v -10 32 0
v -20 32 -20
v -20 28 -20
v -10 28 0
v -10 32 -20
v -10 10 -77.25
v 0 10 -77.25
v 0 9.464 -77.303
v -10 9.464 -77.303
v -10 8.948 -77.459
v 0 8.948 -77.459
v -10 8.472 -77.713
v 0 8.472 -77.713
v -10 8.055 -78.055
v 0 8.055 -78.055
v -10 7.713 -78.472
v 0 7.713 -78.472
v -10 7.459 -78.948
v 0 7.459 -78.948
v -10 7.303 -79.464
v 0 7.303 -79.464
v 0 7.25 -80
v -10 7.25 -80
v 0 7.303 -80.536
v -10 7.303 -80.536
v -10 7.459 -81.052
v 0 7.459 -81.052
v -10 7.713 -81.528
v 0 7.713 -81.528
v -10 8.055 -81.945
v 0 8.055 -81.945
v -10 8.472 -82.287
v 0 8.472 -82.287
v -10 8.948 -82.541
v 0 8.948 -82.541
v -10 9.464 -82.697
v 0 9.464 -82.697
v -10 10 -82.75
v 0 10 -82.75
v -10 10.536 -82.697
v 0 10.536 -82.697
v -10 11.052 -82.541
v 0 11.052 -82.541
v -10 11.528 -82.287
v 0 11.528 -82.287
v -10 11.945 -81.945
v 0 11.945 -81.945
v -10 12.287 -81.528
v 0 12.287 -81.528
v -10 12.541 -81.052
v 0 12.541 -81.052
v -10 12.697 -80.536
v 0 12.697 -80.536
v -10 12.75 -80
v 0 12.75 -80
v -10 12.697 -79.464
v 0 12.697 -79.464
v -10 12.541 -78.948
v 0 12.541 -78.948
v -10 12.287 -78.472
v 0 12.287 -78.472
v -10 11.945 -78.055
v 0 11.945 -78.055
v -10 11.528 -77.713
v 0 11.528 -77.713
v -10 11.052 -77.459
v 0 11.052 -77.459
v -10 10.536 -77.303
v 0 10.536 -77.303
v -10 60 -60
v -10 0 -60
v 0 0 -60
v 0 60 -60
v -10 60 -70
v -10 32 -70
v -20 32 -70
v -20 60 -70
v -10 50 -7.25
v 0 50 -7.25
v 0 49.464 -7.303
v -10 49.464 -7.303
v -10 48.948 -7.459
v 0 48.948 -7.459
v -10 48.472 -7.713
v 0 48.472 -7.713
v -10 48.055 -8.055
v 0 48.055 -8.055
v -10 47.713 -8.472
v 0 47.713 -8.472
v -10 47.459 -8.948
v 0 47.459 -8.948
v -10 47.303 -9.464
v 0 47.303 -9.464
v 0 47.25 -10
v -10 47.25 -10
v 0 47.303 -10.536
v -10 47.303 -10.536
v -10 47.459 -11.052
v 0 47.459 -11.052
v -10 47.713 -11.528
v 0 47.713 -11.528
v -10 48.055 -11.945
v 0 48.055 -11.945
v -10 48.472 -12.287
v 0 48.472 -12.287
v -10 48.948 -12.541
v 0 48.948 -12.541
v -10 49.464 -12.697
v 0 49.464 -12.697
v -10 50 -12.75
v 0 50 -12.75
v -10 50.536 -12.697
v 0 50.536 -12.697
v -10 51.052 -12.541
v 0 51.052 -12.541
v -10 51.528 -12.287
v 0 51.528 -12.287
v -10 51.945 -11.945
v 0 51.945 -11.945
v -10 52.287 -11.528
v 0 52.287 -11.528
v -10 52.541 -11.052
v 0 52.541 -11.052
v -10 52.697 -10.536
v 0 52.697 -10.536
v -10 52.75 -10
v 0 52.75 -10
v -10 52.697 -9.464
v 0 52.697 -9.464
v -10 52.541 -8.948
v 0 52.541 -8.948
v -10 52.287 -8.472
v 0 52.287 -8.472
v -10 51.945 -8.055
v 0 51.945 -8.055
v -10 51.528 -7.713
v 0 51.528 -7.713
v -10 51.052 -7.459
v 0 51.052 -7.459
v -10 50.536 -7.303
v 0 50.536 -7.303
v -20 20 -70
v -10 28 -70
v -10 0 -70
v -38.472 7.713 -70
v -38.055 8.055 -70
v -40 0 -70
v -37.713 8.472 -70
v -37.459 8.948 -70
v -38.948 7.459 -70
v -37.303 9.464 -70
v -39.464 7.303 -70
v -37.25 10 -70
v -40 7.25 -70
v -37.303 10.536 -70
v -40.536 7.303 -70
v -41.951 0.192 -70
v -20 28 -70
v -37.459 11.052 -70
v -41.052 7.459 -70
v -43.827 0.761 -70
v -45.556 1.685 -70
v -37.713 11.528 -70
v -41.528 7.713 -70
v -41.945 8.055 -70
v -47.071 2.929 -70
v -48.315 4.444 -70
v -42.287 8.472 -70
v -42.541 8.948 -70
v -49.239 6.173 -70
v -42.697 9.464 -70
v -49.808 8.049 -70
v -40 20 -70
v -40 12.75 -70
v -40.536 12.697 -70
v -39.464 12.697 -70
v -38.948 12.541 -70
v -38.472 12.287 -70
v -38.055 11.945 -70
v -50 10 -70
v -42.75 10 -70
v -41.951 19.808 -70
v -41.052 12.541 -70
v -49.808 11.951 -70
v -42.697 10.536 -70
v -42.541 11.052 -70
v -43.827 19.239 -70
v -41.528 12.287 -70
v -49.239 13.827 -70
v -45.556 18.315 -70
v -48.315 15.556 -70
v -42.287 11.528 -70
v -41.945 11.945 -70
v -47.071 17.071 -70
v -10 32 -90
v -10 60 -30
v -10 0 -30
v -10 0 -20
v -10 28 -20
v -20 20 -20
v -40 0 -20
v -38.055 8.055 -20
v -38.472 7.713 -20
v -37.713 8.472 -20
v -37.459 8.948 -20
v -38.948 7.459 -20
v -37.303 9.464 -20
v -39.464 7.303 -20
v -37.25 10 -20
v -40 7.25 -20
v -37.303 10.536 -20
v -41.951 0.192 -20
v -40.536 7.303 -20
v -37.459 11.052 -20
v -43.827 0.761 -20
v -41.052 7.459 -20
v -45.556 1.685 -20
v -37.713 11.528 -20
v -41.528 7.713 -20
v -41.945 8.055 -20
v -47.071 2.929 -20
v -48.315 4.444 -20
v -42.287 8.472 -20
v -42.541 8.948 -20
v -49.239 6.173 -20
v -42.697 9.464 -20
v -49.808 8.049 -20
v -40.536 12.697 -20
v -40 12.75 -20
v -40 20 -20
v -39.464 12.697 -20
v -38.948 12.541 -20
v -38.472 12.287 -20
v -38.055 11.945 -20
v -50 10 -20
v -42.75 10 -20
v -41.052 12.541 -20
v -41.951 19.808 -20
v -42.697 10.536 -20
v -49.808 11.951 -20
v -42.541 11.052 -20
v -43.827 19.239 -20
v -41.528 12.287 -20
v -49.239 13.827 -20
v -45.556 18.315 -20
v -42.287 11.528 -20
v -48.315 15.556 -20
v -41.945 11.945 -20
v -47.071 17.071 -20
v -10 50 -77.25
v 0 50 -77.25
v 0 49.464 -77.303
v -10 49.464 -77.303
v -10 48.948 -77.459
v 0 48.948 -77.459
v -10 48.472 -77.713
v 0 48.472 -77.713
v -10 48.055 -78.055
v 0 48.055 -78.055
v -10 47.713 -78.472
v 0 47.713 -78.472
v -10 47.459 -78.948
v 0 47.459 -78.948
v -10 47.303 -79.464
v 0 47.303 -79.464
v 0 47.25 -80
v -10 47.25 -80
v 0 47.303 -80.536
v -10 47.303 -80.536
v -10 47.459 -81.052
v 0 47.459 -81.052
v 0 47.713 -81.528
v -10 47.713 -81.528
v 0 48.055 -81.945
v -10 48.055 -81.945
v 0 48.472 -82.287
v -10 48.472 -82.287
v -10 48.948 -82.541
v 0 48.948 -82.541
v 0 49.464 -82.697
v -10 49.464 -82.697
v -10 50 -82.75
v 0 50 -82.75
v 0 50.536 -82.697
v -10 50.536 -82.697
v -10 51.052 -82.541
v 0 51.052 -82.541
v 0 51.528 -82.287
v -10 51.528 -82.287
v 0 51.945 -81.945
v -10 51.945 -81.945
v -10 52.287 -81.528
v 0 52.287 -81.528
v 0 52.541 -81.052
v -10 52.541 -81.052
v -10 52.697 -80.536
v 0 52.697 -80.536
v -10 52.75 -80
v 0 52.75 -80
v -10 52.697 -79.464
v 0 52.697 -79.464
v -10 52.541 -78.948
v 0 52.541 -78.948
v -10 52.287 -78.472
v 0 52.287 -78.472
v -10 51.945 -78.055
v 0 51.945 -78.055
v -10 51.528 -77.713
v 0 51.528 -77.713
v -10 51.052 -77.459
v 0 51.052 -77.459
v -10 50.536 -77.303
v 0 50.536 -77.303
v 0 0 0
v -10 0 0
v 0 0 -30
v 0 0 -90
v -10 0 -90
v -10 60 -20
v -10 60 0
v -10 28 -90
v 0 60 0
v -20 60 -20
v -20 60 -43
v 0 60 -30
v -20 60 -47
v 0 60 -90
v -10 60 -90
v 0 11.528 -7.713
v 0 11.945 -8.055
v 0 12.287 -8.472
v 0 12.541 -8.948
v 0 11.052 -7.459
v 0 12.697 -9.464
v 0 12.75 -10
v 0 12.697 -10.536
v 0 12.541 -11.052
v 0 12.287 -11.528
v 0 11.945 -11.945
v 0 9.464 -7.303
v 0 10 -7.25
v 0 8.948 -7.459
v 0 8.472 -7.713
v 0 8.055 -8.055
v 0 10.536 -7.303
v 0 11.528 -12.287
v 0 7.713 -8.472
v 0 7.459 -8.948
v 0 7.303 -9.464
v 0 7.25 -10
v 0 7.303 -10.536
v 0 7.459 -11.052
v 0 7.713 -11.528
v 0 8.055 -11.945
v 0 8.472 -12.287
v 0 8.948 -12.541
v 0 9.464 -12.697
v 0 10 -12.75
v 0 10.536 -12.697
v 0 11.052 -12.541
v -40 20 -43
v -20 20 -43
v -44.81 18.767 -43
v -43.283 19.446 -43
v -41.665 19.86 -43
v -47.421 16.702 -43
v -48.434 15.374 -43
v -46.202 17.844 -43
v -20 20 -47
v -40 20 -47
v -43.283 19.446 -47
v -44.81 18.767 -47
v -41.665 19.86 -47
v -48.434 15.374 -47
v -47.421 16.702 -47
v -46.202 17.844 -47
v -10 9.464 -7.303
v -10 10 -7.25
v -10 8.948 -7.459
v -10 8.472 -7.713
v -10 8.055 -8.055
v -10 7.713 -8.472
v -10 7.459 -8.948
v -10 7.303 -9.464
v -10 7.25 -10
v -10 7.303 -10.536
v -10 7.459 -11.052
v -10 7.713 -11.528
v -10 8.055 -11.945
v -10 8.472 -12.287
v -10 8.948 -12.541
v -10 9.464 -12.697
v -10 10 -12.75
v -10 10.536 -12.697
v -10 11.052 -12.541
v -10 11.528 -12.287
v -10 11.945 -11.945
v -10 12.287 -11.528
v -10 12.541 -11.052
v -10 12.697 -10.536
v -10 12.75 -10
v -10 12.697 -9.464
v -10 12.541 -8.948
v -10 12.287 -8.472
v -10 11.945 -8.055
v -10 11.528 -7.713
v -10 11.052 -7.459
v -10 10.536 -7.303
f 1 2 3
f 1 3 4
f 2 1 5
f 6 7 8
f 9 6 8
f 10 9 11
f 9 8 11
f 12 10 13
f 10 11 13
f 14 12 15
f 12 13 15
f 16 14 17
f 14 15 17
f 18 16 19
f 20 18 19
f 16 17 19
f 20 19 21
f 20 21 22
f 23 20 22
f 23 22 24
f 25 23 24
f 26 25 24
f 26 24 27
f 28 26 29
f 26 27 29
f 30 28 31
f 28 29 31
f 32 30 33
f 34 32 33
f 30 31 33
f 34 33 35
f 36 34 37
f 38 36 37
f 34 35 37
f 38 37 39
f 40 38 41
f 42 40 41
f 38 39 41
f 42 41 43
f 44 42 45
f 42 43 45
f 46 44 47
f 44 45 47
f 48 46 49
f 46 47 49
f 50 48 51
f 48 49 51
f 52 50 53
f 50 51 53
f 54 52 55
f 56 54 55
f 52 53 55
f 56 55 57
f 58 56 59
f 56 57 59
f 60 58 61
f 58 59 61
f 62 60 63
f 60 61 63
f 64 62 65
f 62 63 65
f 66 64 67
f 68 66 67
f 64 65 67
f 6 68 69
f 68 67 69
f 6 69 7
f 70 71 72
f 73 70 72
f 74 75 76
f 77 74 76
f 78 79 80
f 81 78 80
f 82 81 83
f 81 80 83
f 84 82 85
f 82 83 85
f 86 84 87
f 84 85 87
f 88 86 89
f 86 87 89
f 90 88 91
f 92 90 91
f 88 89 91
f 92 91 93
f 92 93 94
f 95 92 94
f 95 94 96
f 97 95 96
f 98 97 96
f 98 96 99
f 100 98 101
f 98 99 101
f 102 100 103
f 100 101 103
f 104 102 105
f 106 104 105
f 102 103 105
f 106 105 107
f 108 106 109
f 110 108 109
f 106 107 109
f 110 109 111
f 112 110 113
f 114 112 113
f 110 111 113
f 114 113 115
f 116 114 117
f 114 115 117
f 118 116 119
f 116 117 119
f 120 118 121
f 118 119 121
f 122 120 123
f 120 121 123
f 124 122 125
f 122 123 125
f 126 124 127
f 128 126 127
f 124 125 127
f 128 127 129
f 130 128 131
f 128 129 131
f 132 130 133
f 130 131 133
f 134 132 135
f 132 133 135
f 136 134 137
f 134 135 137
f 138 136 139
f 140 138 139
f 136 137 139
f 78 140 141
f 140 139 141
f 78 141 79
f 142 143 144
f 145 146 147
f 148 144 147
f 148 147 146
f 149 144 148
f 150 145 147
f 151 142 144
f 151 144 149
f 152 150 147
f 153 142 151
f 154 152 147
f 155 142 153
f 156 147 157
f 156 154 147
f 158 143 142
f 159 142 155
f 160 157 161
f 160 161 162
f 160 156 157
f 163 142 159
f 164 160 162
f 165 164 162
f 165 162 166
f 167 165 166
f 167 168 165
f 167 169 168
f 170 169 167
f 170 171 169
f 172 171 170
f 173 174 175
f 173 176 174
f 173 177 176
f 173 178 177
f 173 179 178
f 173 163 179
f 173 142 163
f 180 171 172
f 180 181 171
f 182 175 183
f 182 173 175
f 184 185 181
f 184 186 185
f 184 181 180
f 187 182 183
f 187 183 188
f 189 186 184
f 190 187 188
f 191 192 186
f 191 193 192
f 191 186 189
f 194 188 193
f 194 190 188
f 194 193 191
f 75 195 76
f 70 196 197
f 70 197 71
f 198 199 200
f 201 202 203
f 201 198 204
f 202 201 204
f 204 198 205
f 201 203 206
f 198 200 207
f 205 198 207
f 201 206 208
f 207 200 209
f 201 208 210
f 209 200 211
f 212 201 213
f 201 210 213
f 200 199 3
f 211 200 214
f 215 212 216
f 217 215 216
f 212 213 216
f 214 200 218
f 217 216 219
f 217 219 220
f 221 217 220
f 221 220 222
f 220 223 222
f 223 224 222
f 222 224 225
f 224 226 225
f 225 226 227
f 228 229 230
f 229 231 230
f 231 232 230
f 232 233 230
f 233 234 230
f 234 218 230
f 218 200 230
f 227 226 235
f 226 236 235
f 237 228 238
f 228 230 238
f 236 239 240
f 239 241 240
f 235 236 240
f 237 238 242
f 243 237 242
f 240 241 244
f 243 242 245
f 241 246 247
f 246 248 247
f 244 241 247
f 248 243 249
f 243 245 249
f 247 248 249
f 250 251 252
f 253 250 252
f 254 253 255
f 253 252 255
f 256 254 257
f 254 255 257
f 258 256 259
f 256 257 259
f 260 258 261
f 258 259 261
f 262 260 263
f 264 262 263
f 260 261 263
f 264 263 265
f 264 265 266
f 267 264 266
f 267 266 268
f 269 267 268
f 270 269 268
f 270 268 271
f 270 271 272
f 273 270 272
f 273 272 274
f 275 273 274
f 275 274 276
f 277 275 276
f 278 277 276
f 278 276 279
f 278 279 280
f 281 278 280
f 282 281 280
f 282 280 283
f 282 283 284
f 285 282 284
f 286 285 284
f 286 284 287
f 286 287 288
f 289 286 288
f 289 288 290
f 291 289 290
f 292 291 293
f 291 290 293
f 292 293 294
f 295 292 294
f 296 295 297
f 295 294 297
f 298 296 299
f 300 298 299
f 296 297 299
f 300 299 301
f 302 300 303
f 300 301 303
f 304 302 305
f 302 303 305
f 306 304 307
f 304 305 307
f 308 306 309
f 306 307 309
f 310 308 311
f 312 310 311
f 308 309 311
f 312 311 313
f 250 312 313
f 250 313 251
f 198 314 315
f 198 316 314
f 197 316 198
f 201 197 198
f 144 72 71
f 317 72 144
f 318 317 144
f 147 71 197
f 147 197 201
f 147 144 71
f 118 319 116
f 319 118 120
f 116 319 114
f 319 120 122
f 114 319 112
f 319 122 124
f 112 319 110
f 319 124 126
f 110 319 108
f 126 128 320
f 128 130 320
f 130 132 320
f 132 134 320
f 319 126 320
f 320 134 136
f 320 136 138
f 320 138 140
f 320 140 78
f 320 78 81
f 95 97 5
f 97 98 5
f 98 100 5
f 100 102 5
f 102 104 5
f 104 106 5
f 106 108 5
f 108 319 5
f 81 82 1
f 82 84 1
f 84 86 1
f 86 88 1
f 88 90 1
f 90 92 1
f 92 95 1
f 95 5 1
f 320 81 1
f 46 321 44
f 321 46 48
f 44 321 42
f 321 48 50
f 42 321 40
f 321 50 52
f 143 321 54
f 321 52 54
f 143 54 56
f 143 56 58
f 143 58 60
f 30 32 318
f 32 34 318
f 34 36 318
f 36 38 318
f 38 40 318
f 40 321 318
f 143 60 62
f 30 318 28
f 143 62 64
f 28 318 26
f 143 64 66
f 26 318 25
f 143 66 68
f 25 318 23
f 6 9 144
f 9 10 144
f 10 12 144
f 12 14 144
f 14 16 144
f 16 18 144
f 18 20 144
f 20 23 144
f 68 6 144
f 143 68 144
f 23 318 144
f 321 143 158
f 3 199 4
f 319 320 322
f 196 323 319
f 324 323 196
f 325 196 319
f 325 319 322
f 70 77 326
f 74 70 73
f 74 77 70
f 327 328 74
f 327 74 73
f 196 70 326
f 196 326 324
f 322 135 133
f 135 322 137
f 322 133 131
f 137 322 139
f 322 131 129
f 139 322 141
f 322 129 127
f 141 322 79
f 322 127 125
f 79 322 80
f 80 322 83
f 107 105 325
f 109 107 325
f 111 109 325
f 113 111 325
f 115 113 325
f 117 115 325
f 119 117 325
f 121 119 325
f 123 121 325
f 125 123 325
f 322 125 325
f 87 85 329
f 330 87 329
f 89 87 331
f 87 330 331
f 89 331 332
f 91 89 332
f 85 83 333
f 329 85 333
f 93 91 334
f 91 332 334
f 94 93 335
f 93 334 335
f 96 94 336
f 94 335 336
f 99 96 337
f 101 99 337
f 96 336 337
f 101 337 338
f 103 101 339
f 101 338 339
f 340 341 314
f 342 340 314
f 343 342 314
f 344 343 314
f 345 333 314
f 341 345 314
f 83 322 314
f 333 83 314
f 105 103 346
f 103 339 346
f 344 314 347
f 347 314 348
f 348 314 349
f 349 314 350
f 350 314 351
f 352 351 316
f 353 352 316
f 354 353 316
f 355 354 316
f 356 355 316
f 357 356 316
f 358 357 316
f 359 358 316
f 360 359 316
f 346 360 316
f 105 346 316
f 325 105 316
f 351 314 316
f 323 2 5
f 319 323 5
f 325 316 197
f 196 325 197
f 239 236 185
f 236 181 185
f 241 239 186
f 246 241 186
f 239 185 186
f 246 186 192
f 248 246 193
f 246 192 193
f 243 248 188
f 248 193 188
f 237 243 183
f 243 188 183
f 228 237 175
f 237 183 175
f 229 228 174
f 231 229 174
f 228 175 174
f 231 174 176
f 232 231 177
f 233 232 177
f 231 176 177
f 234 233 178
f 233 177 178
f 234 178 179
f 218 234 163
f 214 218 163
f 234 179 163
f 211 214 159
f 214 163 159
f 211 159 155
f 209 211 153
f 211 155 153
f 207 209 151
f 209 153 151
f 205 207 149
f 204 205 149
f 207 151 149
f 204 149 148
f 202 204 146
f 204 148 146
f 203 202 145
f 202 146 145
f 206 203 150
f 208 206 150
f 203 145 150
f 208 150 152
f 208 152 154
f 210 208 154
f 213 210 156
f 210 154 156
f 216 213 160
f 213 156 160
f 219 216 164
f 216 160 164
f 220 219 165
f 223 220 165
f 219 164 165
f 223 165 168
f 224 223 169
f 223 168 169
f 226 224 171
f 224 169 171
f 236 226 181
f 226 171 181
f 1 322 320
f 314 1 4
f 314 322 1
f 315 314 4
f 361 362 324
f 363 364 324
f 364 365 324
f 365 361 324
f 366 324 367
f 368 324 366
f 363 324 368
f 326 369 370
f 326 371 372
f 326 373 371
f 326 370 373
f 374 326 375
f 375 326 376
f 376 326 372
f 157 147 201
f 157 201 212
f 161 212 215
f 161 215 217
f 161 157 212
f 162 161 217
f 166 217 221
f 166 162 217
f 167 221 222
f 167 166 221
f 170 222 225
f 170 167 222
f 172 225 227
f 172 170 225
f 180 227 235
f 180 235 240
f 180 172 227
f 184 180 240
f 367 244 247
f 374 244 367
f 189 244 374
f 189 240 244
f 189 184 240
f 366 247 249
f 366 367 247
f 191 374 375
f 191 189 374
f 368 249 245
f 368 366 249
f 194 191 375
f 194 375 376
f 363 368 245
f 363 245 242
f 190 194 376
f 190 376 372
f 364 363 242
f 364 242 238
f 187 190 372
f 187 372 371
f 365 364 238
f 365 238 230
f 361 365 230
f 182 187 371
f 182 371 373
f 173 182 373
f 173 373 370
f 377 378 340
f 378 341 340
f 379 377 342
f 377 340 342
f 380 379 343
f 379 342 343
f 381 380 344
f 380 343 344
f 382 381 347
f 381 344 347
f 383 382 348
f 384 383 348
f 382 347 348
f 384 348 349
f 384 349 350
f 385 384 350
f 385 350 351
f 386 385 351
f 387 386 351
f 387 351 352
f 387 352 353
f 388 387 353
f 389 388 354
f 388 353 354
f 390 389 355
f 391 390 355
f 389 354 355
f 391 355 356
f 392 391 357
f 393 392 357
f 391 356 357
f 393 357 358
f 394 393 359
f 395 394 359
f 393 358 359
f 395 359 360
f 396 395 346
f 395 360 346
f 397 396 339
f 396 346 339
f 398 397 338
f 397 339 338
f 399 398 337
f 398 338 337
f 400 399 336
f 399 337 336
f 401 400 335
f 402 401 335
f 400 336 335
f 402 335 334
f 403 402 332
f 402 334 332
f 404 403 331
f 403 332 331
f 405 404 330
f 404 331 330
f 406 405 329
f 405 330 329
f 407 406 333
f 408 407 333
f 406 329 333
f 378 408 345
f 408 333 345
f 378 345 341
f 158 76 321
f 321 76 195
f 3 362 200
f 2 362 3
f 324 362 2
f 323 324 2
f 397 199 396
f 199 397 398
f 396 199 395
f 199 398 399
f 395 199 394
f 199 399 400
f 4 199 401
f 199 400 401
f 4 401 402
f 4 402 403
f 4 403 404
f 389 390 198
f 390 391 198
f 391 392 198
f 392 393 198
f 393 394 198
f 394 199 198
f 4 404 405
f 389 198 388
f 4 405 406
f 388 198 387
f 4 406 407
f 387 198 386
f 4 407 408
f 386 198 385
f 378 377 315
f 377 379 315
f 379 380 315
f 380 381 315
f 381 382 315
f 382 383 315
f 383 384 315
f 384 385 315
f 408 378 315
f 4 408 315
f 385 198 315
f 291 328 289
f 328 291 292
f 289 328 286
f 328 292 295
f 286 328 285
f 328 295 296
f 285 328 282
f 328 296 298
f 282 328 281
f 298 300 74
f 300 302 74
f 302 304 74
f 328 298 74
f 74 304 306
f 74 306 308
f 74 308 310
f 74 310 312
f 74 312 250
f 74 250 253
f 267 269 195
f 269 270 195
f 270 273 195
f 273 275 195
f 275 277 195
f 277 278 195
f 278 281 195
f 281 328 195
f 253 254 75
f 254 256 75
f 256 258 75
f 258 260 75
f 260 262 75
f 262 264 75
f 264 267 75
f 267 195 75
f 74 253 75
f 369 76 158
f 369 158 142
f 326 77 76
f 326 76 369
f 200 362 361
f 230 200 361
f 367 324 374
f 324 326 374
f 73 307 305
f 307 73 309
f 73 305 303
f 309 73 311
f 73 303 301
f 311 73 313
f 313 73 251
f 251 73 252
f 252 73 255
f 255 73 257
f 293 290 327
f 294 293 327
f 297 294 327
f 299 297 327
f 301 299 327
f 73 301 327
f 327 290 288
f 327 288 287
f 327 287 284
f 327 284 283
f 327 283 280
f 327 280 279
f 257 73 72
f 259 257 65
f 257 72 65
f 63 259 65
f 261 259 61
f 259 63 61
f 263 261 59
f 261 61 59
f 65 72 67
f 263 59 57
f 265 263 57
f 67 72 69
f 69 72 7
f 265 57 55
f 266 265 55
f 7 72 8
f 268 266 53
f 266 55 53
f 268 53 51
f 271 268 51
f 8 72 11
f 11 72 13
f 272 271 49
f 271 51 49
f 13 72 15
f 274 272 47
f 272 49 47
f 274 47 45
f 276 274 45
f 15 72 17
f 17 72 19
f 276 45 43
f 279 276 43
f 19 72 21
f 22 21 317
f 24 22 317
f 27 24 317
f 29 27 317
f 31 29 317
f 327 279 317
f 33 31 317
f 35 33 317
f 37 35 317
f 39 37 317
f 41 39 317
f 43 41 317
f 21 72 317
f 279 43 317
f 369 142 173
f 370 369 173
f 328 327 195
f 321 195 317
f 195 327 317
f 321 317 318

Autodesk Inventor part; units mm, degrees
ref_plane "YZ Plane" through (0, 0, 0) normal (1, 0, 0) x (0, 1, 0)
ref_plane "XZ Plane" through (0, 0, 0) normal (0, 1, 0) x (-1, 0, 0)
sketch "Sketch1" plane through (0, 0, 0) normal (0, 1, 0) x (-1, 0, 0)
  line L0 (0, 0) -> (10, 0)
  line L1 (0, 0) -> (0, -30)
  line L2 (0, -30) -> (10, -30)
  line L3 (10, -30) -> (10, -60)
  line L4 (10, -60) -> (0, -60)
  line L5 (0, -60) -> (0, -90)
  line L6 (0, -90) -> (10, -90)
  line L7 (10, -90) -> (10, -70)
  line L8 (10, -70) -> (20, -70)
  line L9 (20, -70) -> (20, -20)
  line L10 (20, -20) -> (10, -20)
  line L11 (10, -20) -> (10, 0)
  dimension "d0" = 10
  dimension "d1" = 30
  dimension "d2" = 10
  dimension "d3" = 30
  dimension "d4" = 10
  dimension "d5" = 30
  dimension "d6" = 10
  dimension "d7" = 20
  dimension "d8" = 10
  dimension "d9" = 50
extrude "Extrusion1" add sketch "Sketch1" along normal blind 60
sketch "Sketch2" plane through (-10, 0, -90) normal (-1, 0, 0) x (0, 0, 1)
  line L0 (30, 60) -> (0, 60) projected
  line L1 (0, 60) -> (0, 32)
  line L2 (0, 0) -> (0, 60) projected
  line L3 (0, 32) -> (20, 32)
  line L4 (20, 32) -> (20, 28)
  line L5 (20, 28) -> (0, 28)
  line L6 (0, 28) -> (0, 32)
  line L7 (60, 60) -> (30, 60) projected
  line L8 (45, 60) -> (45, 0)
  line L9 (60, 0) -> (30, 0) projected
  line L10 (90, 0) -> (90, 60)
  line L11 (90, 32) -> (70, 32)
  line L12 (70, 32) -> (70, 28)
  line L13 (70, 28) -> (90, 28)
  line L14 (90, 28) -> (90, 32)
  dimension "d12" = 28
  dimension "d13" = 20
  dimension "d14" = 4
extrude "Extrusion2" add sketch "Sketch2" along normal blind 10
sketch "Sketch3" plane through (-10, 32, -70) normal (0, 1, 0) x (1, 0, 0)
  line L0 (-10, 0) -> (-10, -50) projected
  line L1 (10, 20) -> (0, 20) projected
  line L2 (-10, 0) -> (0, 20)
  line L3 (0, 20) -> (-10, 20)
  line L4 (-10, 0) -> (-10, 20) projected
  line L5 (-10, 20) -> (-10, 0)
  line L6 (-10, -50) -> (0, -50) projected
  line L7 (0, -70) -> (10, -70) projected
  line L8 (-10, -50) -> (0, -70)
  line L9 (0, -70) -> (-10, -70)
  line L10 (-10, -70) -> (-10, -50)
extrude "Extrusion3" cut sketch "Sketch3" against normal blind 10
sketch "Sketch4" plane through (-10, 0, -70) normal (0, 0, -1) x (-1, 0, 0)
  line L0 (0, 32) -> (0, 60) projected
  line L1 (0, 60) -> (0, 10)
  line L2 (0, 10) -> (30, 10) construction
  circle A0 centre (30, 10) radius 2.75
  arc A1 (30, 0) -> (30, 20) centre (30, 10) ccw
  line L3 (10, 0) -> (0, 0) projected
  line L4 (0, 0) -> (30, 0)
  line L5 (0, 0) -> (0, 28) projected
  line L6 (0, 0) -> (0, 20)
  line L7 (0, 20) -> (30, 20)
  line L8 (10, 0) -> (10, 28) projected
  line L9 (10, 20) -> (10, 0)
  point P0 (-10, 0)
  dimension "d19" = 50
  dimension "d20" = 30
  dimension "d21" = 5.5
  dimension "d22" = 20
extrude "Extrusion4" add sketch "Sketch4" against normal blind 50 contours L7 A1 L4 L8
ref_plane "Work Plane1" through (-20, 20, -47) normal (0, 0, -1) x (-1, 0, 0)
sketch "Sketch6" plane through (-20, 20, -47) normal (0, 0, -1) x (-1, 0, 0)
  line L0 (0, 40) -> (-10, 40) projected
  line L1 (0, 40) -> (28.4336, -4.6265)
  arc A0 (20, -20) -> (20, 0) centre (20, -10) ccw projected
  arc A1 (20, -20) -> (20, 0) centre (20, -10) ccw projected
  line L2 (28.4336, -4.6265) -> (-1.843, -4.6265)
  line L3 (-20, -20) -> (-20, 40) projected
  line L4 (-1.843, -4.6265) -> (-1.843, 40)
extrude "Extrusion6" add sketch "Sketch6" against normal blind 4
sketch "Sketch7" plane through (-10, 60, -90) normal (-1, 0, 0) x (0, 0, 1)
  line L0 (90, -28) -> (90, 0) projected
  line L1 (70, 0) -> (90, 0) projected
  line L2 (70, -60) -> (90, -60) projected
  line L3 (90, -60) -> (90, -32) projected
  line L4 (0, -60) -> (0, -32) projected
  line L5 (0, -60) -> (20, -60) projected
  line L6 (0, -28) -> (0, 0) projected
  line L7 (0, 0) -> (20, 0) projected
  point P0 (10, -10)
  point P1 (10, -50)
  point P2 (80, -50)
  point P3 (80, -10)
  dimension "d39" = 10
  dimension "d40" = 10
  dimension "d41" = 10
  dimension "d42" = 10
  dimension "d43" = 10
  dimension "d44" = 10
  dimension "d45" = 10
  dimension "d46" = 10
hole "Hole1" at (-10, 50, -80) at (-10, 10, -80) at (-10, 10, -10) at (-10, 50, -10) direction (1, 0, 0) diameter 5.5 end through all
properties part number "MMAE 232 Assignment 1d-Nicholas Skiba" material "Aluminum 6061"
